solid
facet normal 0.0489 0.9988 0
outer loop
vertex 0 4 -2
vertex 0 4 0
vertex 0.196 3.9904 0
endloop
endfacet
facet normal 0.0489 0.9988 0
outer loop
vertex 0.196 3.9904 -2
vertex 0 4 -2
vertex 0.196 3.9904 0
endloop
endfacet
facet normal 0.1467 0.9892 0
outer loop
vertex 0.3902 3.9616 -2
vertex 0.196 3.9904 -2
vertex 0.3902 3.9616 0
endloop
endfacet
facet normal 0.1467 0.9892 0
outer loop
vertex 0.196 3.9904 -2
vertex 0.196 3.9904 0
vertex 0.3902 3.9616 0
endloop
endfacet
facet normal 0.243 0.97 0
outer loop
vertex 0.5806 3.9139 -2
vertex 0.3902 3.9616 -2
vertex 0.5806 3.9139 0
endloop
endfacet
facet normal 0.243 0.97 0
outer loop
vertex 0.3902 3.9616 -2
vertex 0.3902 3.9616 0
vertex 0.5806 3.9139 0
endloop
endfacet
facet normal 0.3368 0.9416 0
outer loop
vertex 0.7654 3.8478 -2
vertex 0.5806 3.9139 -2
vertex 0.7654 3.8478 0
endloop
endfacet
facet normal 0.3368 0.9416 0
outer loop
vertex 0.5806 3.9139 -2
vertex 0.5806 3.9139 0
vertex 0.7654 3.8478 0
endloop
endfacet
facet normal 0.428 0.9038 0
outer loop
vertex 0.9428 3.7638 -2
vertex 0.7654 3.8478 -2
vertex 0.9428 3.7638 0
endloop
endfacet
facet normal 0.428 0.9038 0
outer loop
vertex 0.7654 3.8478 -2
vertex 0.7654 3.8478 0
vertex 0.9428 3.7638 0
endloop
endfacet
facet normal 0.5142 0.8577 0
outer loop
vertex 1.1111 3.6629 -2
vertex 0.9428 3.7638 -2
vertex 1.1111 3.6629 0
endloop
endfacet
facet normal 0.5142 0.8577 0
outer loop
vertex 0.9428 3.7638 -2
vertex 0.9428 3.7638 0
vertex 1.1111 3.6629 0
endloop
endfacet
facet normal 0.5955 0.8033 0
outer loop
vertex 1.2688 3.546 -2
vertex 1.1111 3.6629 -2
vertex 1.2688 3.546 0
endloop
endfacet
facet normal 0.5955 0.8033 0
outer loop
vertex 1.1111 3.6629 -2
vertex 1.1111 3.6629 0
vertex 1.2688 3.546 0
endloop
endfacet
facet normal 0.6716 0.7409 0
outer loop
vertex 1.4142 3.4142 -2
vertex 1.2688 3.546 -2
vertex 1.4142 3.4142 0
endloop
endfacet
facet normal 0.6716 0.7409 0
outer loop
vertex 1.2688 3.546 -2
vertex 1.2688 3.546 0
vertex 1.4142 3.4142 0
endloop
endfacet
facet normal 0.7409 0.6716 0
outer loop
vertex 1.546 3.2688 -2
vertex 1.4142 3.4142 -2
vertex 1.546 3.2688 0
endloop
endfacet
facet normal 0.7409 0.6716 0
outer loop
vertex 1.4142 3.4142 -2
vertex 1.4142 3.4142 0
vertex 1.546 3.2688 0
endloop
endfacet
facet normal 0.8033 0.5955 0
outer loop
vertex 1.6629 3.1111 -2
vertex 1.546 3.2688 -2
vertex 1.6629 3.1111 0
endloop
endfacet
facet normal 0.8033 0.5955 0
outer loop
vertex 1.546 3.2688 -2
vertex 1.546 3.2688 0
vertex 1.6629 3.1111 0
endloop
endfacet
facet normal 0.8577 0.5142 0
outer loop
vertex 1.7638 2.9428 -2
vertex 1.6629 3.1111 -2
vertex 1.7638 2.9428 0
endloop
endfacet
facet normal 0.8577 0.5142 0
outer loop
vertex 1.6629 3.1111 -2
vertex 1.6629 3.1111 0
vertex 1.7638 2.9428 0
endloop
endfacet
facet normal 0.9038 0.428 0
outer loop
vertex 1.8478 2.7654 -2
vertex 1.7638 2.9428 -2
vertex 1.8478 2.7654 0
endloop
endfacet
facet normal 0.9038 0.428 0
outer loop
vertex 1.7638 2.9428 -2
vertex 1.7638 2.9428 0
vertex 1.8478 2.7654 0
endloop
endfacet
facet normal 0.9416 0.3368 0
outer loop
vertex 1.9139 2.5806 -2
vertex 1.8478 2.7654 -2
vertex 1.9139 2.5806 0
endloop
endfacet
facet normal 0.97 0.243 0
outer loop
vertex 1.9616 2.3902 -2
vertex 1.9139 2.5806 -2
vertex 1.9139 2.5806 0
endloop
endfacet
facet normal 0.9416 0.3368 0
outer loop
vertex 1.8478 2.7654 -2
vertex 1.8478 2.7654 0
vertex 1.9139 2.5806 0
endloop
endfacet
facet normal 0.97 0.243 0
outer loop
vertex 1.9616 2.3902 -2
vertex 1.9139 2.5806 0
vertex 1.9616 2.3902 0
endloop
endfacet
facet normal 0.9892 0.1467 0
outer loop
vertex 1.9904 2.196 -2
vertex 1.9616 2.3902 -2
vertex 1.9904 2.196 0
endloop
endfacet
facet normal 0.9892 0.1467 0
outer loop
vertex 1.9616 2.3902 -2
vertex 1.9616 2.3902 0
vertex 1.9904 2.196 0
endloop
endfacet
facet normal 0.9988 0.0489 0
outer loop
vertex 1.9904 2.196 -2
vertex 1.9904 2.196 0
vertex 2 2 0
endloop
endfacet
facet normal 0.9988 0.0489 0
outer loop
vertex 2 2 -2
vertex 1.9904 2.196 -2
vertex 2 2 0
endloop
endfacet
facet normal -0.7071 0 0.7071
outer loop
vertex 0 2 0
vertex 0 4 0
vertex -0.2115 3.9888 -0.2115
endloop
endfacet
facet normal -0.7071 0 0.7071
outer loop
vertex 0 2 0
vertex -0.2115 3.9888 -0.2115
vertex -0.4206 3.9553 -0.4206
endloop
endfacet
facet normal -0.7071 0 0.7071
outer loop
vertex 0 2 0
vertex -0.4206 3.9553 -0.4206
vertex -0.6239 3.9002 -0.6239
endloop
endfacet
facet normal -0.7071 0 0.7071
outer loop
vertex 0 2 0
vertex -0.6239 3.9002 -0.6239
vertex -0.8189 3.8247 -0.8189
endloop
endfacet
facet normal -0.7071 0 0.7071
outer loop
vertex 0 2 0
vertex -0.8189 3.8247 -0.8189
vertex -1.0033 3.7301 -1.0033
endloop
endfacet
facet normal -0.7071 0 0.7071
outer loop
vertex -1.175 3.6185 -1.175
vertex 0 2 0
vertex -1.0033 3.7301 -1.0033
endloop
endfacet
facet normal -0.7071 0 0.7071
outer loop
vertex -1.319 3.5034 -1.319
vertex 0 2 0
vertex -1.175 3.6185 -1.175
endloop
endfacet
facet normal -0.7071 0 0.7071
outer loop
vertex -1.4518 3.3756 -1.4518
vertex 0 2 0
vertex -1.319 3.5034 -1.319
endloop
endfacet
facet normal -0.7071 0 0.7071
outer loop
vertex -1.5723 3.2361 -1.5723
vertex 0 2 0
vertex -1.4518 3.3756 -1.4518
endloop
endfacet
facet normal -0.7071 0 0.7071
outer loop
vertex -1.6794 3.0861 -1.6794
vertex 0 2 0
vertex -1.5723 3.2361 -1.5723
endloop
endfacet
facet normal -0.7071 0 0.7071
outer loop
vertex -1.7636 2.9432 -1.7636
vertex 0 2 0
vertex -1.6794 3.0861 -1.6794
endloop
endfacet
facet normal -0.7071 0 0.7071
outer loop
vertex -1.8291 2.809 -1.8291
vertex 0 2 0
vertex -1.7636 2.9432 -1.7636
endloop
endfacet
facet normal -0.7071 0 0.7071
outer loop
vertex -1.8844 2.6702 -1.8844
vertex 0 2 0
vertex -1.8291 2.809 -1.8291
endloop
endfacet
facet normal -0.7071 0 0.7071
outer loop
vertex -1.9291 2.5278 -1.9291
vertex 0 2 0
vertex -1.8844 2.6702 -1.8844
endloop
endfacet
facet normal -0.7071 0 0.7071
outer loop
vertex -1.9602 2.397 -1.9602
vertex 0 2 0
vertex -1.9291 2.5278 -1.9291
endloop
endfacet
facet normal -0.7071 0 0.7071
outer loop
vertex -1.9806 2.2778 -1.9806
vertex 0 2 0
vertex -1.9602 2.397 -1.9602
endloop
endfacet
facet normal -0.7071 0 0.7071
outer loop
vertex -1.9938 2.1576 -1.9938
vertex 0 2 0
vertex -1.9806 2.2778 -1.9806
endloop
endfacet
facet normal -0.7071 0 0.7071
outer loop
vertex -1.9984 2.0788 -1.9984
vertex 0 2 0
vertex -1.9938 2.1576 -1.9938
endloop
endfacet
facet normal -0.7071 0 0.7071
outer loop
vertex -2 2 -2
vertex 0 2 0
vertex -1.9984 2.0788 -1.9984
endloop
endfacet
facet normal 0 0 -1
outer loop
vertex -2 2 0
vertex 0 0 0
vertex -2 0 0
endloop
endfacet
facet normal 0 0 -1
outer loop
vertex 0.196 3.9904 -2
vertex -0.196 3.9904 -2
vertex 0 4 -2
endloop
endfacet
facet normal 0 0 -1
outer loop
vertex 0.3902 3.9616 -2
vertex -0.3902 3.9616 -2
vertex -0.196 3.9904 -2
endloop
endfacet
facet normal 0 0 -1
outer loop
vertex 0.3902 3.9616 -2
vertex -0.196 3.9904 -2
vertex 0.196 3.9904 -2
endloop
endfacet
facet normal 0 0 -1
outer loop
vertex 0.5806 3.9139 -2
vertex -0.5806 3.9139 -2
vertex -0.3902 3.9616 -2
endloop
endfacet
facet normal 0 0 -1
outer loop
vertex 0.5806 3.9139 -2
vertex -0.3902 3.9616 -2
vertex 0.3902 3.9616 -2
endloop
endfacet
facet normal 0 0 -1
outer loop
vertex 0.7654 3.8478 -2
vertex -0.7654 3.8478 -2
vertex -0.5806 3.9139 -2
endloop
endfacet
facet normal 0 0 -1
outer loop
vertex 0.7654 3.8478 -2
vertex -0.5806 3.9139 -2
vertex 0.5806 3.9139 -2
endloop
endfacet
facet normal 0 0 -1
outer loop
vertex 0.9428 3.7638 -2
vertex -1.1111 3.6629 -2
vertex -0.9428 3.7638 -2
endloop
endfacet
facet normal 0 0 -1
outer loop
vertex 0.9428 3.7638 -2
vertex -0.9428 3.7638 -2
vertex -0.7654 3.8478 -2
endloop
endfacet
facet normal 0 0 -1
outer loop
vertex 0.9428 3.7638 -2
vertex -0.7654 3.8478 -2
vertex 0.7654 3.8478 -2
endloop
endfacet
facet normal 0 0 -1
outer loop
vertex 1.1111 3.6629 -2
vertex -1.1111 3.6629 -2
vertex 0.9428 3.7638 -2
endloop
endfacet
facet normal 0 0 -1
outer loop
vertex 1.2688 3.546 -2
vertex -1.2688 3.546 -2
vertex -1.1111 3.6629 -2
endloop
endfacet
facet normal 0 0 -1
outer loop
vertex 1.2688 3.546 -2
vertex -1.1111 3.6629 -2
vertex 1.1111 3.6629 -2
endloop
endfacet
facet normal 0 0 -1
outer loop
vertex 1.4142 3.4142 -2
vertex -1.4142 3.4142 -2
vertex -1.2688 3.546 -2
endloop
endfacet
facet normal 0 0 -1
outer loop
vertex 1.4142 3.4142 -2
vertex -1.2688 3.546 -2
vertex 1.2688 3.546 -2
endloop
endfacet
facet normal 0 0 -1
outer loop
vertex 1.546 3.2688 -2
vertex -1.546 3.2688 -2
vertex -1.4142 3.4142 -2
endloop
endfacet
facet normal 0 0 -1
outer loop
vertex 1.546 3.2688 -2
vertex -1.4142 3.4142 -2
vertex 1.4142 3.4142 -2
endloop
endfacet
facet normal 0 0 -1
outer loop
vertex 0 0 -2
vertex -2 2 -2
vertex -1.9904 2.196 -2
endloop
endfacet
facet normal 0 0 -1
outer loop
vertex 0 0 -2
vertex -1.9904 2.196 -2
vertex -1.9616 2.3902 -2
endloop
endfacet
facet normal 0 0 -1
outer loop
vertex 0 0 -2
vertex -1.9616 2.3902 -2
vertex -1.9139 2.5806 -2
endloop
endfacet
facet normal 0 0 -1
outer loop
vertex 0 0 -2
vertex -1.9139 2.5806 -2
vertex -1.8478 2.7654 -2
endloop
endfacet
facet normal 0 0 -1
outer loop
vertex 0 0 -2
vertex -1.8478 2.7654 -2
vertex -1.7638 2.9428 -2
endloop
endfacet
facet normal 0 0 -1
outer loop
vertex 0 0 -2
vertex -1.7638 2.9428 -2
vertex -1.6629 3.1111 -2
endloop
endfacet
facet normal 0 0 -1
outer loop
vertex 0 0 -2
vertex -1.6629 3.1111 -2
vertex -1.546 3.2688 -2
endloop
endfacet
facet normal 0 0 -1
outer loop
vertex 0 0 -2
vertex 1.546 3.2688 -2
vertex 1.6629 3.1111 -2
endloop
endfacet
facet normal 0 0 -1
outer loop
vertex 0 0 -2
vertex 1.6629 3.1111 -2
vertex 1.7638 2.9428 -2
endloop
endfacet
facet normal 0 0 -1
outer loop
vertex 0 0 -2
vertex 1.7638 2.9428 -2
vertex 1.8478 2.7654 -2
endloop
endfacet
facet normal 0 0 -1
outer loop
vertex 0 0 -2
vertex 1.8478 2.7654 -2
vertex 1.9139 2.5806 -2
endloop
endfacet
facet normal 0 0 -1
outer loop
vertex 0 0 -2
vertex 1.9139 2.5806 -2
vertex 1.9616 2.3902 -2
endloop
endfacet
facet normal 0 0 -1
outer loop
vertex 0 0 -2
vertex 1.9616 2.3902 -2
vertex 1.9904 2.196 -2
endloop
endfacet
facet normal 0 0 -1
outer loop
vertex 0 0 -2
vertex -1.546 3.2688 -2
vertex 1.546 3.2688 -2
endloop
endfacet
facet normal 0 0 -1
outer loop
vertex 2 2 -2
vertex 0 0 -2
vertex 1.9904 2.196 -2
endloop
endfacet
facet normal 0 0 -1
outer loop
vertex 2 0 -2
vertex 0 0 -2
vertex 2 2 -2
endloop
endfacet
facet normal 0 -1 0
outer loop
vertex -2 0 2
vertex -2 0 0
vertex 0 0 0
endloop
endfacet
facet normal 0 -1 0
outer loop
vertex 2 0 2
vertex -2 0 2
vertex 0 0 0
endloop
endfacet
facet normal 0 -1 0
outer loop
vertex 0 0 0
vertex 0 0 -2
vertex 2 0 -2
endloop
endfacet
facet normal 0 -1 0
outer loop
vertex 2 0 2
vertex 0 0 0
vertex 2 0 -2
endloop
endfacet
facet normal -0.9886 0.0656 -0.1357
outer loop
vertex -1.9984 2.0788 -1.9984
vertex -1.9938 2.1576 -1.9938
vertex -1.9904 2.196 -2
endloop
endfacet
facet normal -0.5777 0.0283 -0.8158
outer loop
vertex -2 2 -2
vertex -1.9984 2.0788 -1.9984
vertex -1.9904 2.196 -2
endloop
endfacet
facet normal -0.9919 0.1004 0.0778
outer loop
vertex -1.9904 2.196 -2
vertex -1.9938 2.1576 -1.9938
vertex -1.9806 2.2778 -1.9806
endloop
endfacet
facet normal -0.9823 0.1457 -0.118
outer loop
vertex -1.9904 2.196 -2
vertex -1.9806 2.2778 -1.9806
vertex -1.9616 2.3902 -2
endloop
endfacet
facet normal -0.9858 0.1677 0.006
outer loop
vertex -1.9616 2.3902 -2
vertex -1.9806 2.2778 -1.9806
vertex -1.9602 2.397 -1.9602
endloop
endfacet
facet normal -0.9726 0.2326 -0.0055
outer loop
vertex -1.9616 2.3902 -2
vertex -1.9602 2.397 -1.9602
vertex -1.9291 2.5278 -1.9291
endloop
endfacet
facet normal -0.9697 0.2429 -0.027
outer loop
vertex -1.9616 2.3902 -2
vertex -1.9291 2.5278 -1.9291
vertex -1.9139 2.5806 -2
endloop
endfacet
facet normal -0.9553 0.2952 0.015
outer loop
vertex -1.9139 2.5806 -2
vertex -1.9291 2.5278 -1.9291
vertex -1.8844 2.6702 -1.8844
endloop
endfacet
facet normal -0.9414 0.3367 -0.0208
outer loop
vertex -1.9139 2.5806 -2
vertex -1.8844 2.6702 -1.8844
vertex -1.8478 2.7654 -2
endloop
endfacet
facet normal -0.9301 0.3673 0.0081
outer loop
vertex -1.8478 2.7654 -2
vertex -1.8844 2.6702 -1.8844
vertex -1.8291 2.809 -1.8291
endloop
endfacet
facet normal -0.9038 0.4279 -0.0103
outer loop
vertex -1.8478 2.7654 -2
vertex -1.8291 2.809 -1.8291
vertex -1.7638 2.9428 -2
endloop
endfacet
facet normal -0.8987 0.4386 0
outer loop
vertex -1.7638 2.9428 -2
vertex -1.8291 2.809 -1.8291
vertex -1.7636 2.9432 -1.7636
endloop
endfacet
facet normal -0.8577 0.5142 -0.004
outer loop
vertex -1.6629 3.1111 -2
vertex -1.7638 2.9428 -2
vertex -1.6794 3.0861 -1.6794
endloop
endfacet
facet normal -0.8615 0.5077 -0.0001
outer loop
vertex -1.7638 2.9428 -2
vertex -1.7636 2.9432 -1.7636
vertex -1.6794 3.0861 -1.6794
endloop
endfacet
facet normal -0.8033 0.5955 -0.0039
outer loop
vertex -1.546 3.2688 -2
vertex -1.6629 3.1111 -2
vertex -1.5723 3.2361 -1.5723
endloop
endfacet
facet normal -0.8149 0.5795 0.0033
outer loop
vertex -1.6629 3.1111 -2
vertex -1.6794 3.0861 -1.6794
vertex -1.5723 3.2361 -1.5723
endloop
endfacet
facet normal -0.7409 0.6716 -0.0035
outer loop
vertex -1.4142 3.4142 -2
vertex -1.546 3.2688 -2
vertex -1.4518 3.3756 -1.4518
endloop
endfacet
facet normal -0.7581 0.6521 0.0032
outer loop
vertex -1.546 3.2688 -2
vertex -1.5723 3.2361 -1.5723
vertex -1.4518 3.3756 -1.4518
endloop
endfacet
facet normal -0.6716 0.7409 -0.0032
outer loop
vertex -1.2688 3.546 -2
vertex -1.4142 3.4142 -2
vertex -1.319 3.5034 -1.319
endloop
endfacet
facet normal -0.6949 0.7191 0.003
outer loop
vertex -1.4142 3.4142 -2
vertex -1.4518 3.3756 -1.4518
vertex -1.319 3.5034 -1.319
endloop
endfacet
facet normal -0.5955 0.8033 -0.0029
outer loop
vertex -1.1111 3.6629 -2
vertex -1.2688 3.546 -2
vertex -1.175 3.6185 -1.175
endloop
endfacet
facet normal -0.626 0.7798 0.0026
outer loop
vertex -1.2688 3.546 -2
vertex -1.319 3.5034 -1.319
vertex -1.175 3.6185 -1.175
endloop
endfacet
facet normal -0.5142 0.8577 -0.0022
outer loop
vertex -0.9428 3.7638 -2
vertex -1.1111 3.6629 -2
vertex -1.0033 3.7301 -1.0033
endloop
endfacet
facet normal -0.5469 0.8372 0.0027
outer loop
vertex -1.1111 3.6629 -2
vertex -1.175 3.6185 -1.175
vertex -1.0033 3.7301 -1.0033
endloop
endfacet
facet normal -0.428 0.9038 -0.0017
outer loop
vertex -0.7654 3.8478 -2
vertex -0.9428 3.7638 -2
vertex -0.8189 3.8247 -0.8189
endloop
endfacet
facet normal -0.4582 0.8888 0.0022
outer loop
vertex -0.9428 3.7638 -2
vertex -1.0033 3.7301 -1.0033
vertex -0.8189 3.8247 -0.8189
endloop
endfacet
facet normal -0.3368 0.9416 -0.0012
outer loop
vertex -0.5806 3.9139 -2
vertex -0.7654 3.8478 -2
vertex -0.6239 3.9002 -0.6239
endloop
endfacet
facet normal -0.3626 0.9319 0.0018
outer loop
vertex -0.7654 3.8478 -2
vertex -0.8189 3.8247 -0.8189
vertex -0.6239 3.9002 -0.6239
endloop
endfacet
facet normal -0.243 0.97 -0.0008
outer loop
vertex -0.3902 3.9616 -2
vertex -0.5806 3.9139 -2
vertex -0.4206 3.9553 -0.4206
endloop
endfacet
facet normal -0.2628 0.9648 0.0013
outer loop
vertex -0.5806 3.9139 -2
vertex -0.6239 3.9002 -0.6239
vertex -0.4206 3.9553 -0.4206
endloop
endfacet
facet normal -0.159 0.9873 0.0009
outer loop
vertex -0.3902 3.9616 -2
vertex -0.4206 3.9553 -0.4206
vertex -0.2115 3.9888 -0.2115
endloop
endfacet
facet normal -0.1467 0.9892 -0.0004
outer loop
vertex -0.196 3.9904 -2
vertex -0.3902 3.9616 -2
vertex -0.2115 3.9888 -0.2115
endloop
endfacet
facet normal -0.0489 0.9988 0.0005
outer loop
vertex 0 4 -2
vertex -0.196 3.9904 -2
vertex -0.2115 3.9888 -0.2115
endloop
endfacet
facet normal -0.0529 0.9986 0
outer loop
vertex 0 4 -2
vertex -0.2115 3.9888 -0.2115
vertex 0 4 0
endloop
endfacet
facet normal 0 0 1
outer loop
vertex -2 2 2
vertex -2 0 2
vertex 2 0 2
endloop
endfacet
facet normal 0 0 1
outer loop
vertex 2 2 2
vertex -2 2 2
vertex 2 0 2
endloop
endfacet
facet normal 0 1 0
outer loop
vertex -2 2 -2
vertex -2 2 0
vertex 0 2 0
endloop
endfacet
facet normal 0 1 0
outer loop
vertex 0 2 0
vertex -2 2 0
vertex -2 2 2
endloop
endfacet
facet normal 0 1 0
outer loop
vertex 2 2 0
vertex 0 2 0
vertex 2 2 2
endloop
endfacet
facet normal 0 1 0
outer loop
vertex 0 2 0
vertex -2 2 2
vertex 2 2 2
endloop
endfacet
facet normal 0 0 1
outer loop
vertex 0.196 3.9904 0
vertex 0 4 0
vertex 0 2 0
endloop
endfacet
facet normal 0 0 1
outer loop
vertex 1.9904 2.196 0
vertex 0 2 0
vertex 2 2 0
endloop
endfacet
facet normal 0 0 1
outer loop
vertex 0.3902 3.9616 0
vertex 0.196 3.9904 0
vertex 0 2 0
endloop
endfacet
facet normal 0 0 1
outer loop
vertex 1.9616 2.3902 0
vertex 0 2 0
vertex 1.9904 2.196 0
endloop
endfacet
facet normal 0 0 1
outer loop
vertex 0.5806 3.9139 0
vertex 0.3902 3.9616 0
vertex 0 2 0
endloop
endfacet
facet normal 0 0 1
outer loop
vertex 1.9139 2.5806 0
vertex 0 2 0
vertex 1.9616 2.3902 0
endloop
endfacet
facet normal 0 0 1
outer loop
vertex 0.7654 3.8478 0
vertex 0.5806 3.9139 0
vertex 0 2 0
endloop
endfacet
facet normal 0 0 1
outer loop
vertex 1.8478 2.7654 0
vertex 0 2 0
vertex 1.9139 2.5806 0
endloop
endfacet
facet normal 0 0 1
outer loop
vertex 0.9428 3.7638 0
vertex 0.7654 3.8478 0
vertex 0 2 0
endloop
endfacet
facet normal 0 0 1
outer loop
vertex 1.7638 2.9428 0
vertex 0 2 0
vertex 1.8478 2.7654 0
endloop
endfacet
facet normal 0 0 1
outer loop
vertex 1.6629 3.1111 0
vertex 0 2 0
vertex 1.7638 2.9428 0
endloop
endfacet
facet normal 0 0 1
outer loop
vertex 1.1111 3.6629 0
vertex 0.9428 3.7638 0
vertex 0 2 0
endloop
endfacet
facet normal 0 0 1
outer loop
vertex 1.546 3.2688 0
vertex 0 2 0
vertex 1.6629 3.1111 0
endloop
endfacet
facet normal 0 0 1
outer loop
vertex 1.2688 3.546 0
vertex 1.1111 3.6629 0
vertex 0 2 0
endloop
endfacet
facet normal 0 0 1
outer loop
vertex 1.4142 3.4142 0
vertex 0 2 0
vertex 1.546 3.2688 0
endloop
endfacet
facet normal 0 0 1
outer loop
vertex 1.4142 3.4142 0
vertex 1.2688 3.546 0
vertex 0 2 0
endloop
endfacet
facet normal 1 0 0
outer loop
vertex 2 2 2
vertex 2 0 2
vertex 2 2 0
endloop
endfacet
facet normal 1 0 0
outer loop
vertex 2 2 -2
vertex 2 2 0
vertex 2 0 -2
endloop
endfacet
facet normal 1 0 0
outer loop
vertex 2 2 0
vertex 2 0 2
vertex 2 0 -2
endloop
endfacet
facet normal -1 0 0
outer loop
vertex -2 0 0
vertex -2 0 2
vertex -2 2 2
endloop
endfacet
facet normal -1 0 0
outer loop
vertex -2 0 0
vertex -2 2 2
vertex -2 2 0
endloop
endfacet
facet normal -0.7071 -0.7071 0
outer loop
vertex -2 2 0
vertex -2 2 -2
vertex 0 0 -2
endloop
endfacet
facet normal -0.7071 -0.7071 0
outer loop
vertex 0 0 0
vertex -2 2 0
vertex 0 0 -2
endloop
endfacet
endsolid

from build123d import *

# Parameters (mm, degrees)
SKETCH1_W           = 4
SKETCH1_H           = 4
BOSS_EXTRUDE1_DEPTH = 4
SKETCH2_W           = 4
SKETCH2_H           = 2
CUT_EXTRUDE1_DEPTH  = 2
CUT_EXTRUDE2_DEPTH  = 2
CUT_EXTRUDE3_DEPTH  = 2
CUT_EXTRUDE4_DEPTH  = 2


with BuildPart() as part:
    # Sketch1 → Boss-Extrude1 (new body)
    with BuildSketch(Plane(origin=(0, 0, 0), x_dir=(1, 0, 0), z_dir=(0, 1, 0))):
        Rectangle(SKETCH1_W, SKETCH1_H)
    extrude(amount=BOSS_EXTRUDE1_DEPTH)

    # Sketch2 → Cut-Extrude1 (cut)
    with BuildSketch(Plane.XY.offset(2)):
        with Locations((0, 3)):
            Rectangle(SKETCH2_W, SKETCH2_H)
    extrude(amount=-CUT_EXTRUDE1_DEPTH, mode=Mode.SUBTRACT)

    # Sketch3 → Cut-Extrude2 (cut)
    with BuildSketch(Plane(origin=(0, 0, -2), x_dir=(-1, 0, 0), z_dir=(0, 0, -1))):
        Polygon((2, 2), (0, 0), (2, 0), align=None)
    extrude(amount=-CUT_EXTRUDE2_DEPTH, mode=Mode.SUBTRACT)

    # Sketch4 → Cut-Extrude3 (cut)
    with BuildSketch(Plane.XY):
        with BuildLine():
            Line((-2, 4), (-2, 2))
            ThreePointArc((-2, 2), (-1.414213562, 3.414213562), (0, 4))
            Line((0, 4), (-2, 4))
        make_face()
        with BuildLine():
            Line((2, 4), (0, 4))
            ThreePointArc((0, 4), (1.414213562, 3.414213562), (2, 2))
            Line((2, 2), (2, 4))
        make_face()
    extrude(amount=-CUT_EXTRUDE3_DEPTH, mode=Mode.SUBTRACT)

    # Sketch5 → Cut-Extrude4 (cut)
    with BuildSketch(Plane(origin=(0, 2, 0), x_dir=(1, 0, 0), z_dir=(0, 1, 0))):
        Polygon((0, 0), (-2, 2), (-2, 0), align=None)
    extrude(amount=CUT_EXTRUDE4_DEPTH, mode=Mode.SUBTRACT)


solid = part.part
